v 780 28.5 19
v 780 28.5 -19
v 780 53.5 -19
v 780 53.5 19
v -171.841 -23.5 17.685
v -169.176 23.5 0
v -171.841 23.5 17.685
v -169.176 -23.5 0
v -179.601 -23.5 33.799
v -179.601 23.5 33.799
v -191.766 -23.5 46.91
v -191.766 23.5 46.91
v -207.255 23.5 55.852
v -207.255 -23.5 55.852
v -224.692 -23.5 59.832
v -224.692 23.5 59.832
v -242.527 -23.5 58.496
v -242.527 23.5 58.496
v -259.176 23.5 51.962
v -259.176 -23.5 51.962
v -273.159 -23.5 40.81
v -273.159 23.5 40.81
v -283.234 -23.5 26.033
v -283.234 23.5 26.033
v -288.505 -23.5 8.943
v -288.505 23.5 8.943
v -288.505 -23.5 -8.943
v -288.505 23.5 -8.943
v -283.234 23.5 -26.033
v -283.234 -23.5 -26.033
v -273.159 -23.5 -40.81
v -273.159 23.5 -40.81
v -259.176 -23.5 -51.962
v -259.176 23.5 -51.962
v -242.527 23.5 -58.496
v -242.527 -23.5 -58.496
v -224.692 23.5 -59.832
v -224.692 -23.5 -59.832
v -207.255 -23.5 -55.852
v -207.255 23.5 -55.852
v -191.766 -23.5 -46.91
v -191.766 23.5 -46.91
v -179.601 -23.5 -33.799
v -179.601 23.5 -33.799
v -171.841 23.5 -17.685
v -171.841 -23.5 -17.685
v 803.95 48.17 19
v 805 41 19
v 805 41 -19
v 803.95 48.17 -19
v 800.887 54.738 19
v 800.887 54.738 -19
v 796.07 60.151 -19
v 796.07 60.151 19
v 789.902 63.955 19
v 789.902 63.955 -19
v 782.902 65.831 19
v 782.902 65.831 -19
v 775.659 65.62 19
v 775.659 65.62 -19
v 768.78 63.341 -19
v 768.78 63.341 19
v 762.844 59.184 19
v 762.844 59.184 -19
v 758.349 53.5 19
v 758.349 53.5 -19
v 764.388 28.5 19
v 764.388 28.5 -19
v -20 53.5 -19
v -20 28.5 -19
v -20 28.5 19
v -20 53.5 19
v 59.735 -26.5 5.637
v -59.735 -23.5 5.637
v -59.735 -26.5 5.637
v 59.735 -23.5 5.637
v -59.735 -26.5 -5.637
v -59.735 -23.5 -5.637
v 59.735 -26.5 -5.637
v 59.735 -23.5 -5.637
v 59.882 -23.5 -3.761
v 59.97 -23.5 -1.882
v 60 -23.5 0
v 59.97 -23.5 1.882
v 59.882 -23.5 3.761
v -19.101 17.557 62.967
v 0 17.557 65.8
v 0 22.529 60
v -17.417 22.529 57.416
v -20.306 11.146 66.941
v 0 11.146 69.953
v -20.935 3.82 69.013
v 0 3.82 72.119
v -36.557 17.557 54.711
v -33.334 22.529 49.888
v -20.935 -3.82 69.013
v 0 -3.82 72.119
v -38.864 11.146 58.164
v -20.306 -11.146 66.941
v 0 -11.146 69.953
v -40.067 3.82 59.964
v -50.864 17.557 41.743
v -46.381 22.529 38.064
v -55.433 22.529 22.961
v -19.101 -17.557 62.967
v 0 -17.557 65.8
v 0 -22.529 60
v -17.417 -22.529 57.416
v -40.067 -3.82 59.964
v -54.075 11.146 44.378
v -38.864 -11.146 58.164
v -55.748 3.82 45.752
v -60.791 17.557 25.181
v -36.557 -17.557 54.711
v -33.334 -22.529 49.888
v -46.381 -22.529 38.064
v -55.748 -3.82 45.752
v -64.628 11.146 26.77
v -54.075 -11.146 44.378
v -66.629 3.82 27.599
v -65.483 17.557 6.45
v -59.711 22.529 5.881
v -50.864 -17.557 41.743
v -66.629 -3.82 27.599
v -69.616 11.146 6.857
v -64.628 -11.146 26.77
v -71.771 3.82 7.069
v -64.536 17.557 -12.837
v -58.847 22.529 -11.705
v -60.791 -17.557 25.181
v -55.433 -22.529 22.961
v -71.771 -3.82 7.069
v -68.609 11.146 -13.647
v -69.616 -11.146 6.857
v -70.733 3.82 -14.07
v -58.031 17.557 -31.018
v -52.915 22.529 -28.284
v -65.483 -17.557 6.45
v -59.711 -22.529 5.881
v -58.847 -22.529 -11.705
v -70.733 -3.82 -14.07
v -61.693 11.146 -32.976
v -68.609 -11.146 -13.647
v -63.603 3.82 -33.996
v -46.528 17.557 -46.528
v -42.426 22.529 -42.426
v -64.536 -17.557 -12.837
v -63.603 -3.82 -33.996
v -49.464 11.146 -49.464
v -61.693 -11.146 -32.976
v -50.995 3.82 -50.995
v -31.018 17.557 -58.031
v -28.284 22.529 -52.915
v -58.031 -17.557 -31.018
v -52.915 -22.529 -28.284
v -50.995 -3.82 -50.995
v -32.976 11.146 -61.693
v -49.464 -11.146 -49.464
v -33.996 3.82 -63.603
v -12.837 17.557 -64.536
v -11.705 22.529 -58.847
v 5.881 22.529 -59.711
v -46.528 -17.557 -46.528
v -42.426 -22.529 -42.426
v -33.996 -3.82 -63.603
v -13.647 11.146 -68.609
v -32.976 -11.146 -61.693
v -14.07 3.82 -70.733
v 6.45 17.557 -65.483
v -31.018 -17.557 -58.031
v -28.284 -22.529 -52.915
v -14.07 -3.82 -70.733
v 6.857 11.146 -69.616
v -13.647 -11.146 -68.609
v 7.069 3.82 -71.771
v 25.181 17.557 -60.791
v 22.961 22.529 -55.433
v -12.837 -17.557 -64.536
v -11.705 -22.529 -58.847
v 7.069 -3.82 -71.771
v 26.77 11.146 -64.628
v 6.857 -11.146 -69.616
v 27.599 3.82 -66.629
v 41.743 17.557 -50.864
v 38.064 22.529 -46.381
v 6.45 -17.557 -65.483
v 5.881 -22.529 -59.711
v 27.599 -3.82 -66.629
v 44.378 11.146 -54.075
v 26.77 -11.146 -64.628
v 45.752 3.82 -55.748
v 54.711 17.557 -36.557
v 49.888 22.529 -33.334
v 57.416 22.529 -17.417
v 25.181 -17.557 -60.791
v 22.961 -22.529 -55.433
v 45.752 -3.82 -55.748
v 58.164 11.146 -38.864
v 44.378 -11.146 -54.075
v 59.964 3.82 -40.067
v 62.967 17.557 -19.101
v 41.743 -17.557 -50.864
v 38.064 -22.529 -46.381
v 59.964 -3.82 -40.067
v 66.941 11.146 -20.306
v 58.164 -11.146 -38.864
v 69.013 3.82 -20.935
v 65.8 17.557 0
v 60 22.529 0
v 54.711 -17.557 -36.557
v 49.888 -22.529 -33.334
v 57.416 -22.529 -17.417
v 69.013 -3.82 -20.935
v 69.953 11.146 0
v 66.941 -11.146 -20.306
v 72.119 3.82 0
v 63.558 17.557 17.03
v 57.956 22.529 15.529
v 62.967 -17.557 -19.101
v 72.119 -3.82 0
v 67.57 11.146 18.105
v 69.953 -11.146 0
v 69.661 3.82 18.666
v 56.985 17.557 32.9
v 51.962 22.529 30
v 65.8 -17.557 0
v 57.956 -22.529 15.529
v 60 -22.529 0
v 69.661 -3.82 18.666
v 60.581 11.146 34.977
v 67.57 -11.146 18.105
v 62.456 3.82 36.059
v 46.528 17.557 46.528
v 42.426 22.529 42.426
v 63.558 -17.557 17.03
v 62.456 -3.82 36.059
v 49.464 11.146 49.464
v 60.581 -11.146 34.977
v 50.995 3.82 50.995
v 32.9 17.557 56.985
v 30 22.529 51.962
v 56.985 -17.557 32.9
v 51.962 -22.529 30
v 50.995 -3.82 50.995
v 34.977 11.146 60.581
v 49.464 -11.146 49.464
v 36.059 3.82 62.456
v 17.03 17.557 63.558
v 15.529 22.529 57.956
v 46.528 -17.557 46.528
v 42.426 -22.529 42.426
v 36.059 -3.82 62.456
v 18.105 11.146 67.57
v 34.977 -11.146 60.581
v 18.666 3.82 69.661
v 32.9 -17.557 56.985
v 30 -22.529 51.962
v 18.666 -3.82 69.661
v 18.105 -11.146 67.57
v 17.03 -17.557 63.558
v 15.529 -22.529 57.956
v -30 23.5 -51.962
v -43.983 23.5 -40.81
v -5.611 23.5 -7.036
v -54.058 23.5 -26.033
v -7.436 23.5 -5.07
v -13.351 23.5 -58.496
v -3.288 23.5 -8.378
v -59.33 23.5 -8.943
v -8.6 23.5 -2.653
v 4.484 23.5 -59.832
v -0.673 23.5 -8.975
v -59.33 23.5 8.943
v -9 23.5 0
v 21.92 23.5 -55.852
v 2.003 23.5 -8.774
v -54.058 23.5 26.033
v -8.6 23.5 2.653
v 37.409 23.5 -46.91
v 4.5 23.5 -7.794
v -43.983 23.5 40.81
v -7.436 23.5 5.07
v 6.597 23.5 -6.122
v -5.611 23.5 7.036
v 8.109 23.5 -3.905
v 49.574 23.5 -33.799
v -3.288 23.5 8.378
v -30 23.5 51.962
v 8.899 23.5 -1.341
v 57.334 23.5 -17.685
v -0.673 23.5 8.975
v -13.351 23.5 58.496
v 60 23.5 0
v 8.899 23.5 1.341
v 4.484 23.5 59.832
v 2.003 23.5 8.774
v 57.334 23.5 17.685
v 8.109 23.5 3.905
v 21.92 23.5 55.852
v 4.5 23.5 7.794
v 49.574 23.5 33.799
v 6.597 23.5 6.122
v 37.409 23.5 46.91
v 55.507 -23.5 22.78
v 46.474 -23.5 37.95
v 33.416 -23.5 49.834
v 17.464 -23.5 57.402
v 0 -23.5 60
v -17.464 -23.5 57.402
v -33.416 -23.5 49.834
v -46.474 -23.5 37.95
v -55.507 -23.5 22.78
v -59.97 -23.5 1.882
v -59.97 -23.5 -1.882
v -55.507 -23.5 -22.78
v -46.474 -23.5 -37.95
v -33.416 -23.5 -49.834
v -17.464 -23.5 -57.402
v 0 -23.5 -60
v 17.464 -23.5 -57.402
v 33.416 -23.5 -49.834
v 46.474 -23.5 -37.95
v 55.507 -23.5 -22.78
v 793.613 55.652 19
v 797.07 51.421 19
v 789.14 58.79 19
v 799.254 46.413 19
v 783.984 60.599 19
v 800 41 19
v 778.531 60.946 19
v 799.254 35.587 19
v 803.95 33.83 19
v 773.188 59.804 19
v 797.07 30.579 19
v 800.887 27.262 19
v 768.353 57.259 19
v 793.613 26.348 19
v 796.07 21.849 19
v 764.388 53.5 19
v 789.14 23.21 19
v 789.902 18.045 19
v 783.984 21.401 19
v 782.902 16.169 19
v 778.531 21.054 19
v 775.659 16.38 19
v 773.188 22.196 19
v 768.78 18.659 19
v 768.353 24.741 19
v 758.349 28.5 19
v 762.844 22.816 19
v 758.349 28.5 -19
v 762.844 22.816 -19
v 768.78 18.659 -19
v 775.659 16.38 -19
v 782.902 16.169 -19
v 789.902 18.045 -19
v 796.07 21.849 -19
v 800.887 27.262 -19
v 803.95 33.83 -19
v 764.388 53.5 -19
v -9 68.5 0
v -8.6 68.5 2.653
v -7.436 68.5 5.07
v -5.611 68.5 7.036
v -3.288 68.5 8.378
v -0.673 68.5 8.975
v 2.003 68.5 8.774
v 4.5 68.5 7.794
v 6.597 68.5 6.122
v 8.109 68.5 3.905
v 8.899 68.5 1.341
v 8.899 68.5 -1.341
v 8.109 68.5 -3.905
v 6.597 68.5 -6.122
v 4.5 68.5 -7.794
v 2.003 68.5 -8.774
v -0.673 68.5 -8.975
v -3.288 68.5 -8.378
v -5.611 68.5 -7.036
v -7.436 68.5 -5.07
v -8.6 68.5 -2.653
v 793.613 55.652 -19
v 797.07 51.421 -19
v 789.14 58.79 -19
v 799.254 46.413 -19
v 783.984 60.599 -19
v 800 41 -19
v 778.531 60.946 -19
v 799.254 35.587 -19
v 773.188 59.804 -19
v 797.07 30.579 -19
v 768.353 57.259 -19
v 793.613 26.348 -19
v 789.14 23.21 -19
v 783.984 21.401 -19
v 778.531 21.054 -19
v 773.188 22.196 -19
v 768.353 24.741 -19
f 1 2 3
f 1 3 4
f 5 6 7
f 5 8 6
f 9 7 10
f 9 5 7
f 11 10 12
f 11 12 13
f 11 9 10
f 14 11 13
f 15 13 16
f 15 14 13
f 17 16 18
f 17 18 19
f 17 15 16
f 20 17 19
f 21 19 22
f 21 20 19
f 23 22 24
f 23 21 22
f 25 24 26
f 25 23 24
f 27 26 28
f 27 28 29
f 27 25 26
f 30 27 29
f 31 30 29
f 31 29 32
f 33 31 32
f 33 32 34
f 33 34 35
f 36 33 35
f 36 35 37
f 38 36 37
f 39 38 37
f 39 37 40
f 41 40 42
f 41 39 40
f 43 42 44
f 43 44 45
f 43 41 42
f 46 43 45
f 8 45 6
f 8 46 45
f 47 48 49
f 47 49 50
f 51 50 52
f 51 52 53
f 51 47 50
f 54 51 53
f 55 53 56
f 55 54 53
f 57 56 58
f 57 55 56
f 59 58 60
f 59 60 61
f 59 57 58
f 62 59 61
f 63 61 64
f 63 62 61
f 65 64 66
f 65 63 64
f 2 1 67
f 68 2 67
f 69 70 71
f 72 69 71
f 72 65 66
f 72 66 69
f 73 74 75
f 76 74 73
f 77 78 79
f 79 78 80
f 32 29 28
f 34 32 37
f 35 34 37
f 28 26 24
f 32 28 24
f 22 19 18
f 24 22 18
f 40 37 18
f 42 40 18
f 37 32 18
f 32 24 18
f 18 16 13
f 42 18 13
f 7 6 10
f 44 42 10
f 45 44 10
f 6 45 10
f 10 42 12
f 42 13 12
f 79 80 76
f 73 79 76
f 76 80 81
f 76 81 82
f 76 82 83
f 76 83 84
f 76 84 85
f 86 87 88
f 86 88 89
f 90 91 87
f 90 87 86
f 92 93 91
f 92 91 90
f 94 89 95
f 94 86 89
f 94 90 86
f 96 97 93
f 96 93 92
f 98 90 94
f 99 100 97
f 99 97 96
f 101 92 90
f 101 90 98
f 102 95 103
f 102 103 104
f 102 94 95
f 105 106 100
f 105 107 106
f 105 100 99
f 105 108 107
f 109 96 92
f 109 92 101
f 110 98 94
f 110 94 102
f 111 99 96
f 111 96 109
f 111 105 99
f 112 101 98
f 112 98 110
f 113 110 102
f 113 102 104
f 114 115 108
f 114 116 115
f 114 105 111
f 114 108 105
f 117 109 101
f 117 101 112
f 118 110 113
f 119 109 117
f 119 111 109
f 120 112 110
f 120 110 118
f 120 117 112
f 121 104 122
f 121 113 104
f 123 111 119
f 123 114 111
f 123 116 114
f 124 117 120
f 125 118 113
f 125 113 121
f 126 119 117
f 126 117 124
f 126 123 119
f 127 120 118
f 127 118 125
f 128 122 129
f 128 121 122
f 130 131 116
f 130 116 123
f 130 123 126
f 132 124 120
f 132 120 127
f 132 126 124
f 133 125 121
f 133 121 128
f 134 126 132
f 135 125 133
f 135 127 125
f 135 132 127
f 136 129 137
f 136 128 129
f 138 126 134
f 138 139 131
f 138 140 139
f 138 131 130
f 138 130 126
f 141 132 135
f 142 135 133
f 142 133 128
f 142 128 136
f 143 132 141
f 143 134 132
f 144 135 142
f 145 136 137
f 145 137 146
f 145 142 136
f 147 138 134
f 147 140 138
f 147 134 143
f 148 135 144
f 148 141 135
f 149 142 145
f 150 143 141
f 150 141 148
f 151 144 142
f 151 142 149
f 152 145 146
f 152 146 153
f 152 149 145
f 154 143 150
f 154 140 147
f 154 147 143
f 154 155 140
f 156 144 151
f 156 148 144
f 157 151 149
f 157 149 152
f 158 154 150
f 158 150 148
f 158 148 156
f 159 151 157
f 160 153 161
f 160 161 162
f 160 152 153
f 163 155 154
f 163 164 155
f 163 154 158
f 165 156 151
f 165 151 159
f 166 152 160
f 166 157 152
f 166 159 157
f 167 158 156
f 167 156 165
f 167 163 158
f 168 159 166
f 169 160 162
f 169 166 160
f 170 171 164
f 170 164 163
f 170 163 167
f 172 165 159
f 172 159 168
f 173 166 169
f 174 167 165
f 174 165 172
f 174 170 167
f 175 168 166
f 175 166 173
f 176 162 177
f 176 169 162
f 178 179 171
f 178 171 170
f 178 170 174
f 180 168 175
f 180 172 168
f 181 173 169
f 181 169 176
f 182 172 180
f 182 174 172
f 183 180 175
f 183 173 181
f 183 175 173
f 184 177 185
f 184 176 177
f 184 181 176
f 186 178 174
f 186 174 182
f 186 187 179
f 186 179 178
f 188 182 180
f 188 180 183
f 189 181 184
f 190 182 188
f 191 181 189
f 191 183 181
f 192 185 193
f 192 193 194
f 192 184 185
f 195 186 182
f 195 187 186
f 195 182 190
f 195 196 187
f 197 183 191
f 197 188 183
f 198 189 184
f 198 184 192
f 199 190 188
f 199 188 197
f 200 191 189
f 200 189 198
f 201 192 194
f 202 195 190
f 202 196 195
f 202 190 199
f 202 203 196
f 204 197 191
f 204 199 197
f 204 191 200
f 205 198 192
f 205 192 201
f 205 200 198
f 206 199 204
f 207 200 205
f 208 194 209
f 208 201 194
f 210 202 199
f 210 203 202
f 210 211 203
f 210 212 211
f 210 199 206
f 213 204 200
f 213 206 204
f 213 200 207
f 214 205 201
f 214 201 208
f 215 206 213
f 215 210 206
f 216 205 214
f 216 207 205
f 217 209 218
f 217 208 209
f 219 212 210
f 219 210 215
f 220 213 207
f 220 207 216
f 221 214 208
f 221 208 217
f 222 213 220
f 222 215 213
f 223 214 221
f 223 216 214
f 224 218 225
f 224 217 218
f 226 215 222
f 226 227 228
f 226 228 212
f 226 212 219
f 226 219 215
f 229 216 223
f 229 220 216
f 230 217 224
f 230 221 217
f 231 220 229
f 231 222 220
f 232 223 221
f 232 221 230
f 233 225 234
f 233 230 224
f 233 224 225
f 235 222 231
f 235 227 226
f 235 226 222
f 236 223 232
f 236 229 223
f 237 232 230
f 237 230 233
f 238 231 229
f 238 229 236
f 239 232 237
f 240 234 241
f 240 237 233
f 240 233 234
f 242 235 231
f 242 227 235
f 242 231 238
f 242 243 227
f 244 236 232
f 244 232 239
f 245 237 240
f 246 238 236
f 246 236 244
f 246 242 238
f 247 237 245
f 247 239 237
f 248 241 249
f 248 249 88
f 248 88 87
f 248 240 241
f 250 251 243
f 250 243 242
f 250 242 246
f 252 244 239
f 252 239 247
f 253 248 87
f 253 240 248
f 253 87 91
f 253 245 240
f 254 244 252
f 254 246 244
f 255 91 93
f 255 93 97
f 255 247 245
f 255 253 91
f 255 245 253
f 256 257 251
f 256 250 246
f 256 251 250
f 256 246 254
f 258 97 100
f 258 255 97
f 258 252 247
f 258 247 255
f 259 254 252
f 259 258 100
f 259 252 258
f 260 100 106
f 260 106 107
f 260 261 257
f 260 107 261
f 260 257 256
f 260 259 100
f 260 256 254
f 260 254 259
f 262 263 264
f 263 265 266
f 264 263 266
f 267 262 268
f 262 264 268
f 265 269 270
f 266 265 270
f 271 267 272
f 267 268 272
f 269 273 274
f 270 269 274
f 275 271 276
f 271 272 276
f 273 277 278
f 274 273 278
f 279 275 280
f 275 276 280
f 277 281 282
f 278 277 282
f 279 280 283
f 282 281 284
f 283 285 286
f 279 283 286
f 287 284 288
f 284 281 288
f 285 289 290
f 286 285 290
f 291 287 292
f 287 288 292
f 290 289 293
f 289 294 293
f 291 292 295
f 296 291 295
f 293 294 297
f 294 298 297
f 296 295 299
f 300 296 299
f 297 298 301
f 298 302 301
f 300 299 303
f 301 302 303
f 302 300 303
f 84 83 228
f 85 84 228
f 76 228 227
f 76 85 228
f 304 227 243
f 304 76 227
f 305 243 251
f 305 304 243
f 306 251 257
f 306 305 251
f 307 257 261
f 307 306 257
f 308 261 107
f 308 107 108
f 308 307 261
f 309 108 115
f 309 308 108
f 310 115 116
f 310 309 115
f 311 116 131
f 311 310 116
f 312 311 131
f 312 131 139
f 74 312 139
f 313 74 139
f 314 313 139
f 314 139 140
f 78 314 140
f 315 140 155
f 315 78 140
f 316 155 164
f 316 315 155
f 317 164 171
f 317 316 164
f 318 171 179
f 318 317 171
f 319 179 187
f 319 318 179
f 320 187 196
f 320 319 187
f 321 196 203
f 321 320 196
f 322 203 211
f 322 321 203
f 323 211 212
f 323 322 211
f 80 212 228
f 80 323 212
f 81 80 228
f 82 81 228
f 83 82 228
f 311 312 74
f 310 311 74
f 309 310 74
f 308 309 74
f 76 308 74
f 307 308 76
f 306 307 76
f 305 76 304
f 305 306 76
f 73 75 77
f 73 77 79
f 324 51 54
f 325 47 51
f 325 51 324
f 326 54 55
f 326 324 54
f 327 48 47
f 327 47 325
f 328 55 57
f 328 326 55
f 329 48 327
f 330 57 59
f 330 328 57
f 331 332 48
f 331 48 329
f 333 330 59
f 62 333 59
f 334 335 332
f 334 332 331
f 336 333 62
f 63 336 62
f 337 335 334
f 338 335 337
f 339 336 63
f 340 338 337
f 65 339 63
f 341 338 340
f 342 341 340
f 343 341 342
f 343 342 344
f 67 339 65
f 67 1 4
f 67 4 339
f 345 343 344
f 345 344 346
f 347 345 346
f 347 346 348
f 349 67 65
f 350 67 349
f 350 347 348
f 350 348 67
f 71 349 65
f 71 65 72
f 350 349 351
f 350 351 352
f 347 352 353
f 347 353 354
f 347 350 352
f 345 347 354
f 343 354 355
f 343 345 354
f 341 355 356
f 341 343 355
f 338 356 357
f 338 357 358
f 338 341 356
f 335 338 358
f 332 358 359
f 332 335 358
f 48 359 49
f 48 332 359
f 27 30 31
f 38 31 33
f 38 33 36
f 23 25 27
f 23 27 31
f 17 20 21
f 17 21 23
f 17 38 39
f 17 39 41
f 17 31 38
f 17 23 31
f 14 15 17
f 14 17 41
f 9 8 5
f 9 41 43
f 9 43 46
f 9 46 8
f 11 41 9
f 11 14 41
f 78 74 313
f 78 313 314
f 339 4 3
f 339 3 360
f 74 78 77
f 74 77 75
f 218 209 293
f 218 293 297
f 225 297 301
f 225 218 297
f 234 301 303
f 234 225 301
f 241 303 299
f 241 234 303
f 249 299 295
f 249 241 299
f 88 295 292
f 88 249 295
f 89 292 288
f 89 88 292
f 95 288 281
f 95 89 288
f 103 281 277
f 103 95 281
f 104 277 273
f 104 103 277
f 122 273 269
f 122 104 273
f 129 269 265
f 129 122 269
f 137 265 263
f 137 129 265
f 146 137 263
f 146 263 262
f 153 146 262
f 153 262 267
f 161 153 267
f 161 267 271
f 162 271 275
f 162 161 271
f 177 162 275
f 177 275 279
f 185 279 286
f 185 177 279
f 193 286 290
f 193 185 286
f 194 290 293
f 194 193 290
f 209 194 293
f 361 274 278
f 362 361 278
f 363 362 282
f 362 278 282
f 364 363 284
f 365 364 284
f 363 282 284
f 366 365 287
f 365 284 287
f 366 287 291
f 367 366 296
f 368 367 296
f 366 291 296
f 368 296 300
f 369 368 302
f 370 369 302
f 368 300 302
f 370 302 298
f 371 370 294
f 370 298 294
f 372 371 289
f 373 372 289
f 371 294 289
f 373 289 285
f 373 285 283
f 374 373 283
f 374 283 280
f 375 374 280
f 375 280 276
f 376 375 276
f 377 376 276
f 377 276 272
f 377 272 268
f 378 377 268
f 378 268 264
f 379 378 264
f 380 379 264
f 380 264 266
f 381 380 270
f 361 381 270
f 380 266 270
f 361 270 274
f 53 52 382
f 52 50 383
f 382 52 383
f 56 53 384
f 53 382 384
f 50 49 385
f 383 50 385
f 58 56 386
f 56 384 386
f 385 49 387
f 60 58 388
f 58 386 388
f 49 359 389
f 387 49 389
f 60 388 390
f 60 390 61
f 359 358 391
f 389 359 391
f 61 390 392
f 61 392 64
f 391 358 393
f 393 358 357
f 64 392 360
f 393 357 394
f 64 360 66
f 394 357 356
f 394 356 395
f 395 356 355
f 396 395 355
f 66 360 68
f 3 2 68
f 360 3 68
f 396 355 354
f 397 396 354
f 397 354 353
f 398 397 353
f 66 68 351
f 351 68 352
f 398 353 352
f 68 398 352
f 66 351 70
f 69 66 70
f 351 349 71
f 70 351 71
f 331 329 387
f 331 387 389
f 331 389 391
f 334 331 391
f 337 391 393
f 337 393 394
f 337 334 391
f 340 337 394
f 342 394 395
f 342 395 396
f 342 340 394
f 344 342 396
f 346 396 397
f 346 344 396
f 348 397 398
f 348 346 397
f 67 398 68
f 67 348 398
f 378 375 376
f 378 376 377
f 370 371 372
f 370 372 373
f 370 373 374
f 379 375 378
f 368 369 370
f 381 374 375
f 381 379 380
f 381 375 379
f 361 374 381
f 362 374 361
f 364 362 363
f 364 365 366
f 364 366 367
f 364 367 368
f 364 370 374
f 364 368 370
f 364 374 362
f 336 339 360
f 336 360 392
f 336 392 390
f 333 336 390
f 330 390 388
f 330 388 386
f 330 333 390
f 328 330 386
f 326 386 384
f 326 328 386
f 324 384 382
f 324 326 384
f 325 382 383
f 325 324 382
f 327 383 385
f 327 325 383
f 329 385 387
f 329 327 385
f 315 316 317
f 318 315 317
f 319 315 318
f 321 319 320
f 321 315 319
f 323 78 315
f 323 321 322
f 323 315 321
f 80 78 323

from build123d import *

# Parameters (mm, degrees)
F0_R      = 60
F2_DEPTH  = 23.5
F1_R      = 60
F6_R      = 9
F7_DEPTH  = 45
F9_W      = 800
F9_H      = 38
F10_DEPTH = 25
F12_DEPTH = 38
F13_W     = 119.4692074683
F13_H     = 11.2742390827
F14_DEPTH = 3


with BuildPart() as f2:
    # F0 (on Front) → F2 (new body, symmetric)
    with BuildSketch(Plane.XZ):
        Circle(F0_R)
    extrude(amount=F2_DEPTH, both=True)

    # F4 (on face) → F5 (revolve)
    with BuildSketch(Plane.YZ):
        with BuildLine():
            Line((-22.529049166, 60), (22.529049166, 60))
            ThreePointArc((22.529049166, 60), (0, 72.3934189958), (-22.529049166, 60))
        make_face()
    revolve(axis=Axis((0, -3.9980601143, 0), (0, -1, 0)))

    # F6 (on face) → F7 (join)
    with BuildSketch(Plane(origin=(0, 23.5, 0), x_dir=(-1, 0, 0), z_dir=(0, 1, 0))):
        Circle(F6_R)
    extrude(amount=F7_DEPTH)

    # F13 (on face) → F14 (join)
    with BuildSketch(Plane.XZ.offset(23.5)):
        Rectangle(F13_W, F13_H)
    extrude(amount=F14_DEPTH)


with BuildPart() as f2b:
    # F1 (on Front) → F2, piece 2 (new body, symmetric)
    with BuildSketch(Plane.XZ):
        with Locations((-229.1755825281, 0)):
            Circle(F1_R)
    extrude(amount=F2_DEPTH, both=True)


with BuildPart() as f10:
    # F9 (on offset) → F10 (new body)
    with BuildSketch(Plane(origin=(0, 28.5, 0), x_dir=(-1, 0, 0), z_dir=(0, 1, 0))):
        with Locations((-380, 0)):
            Rectangle(F9_W, F9_H)
    extrude(amount=F10_DEPTH)

    # F11 (on face) → F12 (join)
    with BuildSketch(Plane.XY.offset(19)):
        with BuildLine():
            ThreePointArc((758.3493649054, 28.5), (786.4704761276, 16.8518543428), (805, 41))
            ThreePointArc((805, 41), (786.4704761276, 65.1481456572), (758.3493649054, 53.5))
            Line((758.3493649054, 53.5), (764.387505004, 53.5))
            ThreePointArc((764.387505004, 53.5), (786.623824427, 59.8712731409), (800, 41))
            ThreePointArc((800, 41), (786.623824427, 22.1287268591), (764.387505004, 28.5))
            Line((764.387505004, 28.5), (758.3493649054, 28.5))
        make_face()
    extrude(amount=-F12_DEPTH)


solid = Compound([f2.part, f2b.part, f10.part])
